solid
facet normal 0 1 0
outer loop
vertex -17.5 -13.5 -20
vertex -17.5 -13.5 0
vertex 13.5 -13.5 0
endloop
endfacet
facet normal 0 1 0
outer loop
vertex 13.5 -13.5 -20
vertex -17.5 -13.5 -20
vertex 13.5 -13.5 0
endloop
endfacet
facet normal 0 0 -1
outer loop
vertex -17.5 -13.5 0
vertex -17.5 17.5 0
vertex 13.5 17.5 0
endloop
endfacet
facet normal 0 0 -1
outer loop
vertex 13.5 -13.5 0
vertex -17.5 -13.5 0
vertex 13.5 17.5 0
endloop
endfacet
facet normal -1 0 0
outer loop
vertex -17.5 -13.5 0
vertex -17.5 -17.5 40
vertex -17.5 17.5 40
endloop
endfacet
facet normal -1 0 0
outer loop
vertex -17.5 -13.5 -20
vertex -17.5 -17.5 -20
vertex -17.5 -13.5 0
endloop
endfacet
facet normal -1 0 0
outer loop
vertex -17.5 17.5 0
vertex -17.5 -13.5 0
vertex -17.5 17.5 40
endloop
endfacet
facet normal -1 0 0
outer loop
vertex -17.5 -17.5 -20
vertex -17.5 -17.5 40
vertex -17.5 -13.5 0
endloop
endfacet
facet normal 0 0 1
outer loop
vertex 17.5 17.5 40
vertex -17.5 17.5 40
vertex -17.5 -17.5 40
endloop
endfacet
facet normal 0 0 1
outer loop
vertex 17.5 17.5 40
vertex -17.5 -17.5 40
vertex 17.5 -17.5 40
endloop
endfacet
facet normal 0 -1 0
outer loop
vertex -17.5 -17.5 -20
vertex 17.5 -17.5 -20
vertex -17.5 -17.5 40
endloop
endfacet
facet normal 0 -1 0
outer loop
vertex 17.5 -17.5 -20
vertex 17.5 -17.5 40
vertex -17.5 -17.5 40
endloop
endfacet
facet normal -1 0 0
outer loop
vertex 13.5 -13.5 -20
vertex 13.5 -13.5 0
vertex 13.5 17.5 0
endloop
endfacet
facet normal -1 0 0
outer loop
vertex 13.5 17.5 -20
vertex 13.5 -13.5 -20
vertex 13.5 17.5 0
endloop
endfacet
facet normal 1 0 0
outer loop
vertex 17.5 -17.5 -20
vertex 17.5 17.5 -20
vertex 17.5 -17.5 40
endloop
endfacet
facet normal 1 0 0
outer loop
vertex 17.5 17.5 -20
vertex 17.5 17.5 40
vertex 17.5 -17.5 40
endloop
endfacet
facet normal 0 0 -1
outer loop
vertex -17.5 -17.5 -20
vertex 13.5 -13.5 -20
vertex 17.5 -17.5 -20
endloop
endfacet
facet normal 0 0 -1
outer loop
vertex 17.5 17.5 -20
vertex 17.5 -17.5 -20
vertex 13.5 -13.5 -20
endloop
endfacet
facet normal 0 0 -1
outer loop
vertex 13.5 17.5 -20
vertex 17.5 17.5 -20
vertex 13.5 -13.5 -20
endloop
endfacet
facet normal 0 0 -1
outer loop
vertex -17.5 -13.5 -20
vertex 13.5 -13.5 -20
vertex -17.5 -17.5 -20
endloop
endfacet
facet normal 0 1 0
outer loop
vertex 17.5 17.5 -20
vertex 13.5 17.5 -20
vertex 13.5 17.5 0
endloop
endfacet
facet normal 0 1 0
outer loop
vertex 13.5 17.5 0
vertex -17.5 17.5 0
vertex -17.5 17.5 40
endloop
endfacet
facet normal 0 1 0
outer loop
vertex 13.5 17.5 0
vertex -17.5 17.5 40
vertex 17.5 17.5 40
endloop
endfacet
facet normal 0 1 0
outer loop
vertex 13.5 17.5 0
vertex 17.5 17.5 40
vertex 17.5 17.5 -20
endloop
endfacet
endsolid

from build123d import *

# Parameters (mm, degrees)
CROQUIS1_W              = 35
CROQUIS1_H              = 35
SALIENTE_EXTRUIR1_DEPTH = 40
SALIENTE_EXTRUIR3_DEPTH = 20


with BuildPart() as part:
    # Croquis1 → Saliente-Extruir1 (new body)
    with BuildSketch(Plane.XY):
        Rectangle(CROQUIS1_W, CROQUIS1_H)
    extrude(amount=SALIENTE_EXTRUIR1_DEPTH)

    # Croquis4 → Saliente-Extruir3 (add)
    with BuildSketch(Plane(origin=(0, 0, 0), x_dir=(-1, 0, 0), z_dir=(0, 0, -1))):
        Polygon((-13.5, 13.5), (-13.5, 17.5), (-17.5, 17.5), (-17.5, -17.5), (17.5, -17.5), (17.5, -13.5), (13.5, -13.5), (-13.5, -13.5), align=None)
    extrude(amount=SALIENTE_EXTRUIR3_DEPTH)


solid = part.part
